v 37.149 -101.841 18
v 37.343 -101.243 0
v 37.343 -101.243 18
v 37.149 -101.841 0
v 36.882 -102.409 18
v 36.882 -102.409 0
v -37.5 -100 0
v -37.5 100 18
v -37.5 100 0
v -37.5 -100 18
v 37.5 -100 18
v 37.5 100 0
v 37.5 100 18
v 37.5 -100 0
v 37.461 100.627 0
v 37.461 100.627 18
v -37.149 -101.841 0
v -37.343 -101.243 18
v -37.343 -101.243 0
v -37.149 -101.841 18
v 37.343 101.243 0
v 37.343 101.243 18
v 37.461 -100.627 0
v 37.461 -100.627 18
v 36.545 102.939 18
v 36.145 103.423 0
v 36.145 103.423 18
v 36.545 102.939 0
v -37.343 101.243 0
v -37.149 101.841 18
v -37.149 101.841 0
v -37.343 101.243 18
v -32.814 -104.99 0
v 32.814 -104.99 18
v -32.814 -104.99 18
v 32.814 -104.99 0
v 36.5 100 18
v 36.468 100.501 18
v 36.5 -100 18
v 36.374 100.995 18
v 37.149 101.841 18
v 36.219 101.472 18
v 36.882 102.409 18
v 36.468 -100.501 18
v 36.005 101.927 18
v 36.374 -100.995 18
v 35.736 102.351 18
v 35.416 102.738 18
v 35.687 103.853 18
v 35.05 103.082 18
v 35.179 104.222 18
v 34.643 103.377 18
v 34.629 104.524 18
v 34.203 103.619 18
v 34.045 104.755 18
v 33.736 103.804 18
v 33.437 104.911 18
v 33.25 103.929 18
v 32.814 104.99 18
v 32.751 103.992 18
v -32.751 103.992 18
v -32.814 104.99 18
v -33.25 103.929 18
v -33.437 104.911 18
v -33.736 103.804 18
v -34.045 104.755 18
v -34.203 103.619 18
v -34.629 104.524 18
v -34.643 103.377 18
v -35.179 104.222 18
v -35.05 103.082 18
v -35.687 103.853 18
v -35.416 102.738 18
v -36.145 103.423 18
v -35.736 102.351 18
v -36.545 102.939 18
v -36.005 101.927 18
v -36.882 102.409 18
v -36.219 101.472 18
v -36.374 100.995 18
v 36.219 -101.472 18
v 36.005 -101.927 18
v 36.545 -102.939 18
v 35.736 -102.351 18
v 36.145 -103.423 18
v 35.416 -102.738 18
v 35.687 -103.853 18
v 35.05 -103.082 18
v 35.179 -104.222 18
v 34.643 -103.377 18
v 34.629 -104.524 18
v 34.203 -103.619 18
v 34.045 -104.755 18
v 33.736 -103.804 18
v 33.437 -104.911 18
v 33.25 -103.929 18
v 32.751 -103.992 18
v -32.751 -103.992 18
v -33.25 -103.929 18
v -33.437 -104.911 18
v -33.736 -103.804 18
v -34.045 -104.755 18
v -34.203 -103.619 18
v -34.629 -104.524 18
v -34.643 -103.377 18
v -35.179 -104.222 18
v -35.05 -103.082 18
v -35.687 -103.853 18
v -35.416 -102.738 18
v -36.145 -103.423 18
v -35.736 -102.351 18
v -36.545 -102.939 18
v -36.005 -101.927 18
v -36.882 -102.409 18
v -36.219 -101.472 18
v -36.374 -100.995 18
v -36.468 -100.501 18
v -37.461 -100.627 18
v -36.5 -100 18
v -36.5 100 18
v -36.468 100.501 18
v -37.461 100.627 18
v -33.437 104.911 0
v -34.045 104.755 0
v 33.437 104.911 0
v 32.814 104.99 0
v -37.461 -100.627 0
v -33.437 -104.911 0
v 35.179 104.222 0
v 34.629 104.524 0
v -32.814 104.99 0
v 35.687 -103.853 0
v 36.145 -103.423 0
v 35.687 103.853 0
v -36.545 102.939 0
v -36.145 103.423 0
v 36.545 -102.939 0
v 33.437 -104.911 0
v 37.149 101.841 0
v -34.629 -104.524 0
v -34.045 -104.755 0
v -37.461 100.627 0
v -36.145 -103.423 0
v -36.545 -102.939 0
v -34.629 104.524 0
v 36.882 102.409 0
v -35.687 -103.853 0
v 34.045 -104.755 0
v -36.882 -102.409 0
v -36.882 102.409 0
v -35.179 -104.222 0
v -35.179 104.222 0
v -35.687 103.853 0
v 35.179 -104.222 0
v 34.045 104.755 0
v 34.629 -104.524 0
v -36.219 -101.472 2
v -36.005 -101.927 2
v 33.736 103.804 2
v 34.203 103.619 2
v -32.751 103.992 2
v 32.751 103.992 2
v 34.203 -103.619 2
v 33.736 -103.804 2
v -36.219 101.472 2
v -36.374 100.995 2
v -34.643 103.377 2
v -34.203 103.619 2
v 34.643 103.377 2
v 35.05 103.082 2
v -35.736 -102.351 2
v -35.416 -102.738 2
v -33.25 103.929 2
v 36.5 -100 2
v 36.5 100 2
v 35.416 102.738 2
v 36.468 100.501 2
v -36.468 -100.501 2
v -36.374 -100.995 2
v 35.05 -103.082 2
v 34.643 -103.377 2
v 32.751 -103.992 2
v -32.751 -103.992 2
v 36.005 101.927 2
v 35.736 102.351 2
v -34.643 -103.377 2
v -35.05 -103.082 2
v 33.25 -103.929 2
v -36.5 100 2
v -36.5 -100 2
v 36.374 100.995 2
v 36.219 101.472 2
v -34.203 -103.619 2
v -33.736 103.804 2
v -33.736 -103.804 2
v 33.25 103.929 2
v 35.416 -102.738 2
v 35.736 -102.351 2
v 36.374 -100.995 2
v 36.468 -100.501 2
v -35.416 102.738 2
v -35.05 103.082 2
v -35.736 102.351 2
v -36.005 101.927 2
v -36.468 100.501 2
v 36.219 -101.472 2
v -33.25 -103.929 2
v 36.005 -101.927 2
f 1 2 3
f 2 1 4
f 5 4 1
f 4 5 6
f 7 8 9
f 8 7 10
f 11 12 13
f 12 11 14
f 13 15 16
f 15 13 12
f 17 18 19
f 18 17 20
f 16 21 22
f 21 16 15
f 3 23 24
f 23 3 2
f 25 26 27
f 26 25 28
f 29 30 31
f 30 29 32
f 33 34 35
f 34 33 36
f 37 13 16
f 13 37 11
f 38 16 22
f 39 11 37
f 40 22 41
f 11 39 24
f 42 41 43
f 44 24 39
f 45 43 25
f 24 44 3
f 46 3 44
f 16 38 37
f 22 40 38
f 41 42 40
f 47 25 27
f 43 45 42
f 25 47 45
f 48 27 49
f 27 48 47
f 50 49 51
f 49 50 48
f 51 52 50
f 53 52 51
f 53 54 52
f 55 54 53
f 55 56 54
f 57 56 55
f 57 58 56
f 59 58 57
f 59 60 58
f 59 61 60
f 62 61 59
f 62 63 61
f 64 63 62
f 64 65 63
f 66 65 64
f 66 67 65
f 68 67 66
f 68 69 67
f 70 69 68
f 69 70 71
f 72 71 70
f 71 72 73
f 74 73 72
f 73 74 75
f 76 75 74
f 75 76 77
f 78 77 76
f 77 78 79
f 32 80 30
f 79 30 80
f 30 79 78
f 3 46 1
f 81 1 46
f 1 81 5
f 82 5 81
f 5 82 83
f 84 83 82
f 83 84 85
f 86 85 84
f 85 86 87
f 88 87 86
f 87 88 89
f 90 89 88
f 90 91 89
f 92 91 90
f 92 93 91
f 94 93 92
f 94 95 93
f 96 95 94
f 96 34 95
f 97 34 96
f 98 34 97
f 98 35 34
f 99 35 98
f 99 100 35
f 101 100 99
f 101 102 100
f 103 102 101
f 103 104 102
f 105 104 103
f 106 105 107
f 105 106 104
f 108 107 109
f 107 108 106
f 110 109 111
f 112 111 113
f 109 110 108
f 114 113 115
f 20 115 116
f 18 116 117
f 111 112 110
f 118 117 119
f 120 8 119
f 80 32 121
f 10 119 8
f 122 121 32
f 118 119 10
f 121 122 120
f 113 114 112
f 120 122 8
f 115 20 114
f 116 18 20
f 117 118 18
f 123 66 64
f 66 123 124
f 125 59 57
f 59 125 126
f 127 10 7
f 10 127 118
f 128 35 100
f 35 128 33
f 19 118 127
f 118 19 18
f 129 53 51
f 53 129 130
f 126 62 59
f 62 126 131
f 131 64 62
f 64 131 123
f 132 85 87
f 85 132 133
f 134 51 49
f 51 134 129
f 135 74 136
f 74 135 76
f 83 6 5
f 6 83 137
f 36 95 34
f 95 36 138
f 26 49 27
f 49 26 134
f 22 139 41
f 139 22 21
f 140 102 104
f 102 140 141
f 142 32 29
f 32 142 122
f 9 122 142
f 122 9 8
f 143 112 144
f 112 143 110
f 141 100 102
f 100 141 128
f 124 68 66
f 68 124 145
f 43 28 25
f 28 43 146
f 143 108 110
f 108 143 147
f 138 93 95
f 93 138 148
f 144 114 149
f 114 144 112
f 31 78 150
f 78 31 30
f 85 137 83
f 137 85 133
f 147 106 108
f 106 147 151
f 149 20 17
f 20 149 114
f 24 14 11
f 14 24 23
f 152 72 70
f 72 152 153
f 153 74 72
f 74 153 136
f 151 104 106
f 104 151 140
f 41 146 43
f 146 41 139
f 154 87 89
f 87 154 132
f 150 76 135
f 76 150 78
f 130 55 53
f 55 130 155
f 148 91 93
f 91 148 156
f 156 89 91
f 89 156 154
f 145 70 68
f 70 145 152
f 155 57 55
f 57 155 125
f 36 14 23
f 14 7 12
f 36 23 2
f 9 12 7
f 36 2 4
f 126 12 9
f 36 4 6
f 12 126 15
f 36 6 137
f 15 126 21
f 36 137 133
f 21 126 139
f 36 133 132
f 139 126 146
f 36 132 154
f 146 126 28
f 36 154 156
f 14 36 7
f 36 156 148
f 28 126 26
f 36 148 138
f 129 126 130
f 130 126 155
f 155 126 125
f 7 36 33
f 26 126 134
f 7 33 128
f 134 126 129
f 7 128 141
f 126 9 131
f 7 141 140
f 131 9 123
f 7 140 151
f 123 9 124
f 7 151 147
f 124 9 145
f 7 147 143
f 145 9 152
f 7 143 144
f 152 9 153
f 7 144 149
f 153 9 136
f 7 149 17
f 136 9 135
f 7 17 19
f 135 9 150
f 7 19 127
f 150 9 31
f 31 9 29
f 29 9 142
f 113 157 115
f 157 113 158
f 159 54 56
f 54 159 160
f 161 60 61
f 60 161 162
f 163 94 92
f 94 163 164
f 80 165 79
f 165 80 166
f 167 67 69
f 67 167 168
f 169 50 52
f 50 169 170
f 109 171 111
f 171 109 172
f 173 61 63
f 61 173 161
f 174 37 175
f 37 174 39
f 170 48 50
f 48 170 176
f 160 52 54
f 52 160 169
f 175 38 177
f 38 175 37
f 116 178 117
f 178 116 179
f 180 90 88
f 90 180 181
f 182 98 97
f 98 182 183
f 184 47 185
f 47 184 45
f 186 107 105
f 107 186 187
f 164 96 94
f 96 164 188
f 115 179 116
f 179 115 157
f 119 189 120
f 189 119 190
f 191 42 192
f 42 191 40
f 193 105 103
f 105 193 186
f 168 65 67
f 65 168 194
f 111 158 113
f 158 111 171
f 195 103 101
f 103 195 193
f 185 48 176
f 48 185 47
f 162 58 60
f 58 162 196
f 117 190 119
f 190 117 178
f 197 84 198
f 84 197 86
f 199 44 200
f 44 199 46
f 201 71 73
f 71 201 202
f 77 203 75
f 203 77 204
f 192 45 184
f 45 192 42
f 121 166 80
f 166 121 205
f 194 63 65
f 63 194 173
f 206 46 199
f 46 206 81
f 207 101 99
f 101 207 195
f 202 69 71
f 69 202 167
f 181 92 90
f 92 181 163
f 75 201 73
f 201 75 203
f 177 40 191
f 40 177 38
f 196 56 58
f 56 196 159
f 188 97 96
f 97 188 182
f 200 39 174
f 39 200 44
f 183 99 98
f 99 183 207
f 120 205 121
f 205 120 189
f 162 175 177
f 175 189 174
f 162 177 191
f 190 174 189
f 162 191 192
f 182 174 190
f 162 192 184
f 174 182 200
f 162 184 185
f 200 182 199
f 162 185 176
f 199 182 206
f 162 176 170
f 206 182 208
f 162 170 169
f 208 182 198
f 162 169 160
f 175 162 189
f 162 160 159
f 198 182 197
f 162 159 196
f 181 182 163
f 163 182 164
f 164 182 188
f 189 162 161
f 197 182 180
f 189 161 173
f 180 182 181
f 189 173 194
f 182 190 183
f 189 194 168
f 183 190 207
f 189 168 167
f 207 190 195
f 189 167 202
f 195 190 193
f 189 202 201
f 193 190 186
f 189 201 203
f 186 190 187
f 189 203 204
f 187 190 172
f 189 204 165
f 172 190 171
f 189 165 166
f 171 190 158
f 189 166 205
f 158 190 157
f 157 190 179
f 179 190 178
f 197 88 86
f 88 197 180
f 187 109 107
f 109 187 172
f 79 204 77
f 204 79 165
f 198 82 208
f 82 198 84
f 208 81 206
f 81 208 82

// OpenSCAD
$fn = 50;


difference() {
	union() {
		hull() {
			translate(v = [-32.5000000000, 100.0000000000, 0]) {
				cylinder(h = 18, r = 5);
			}
			translate(v = [32.5000000000, 100.0000000000, 0]) {
				cylinder(h = 18, r = 5);
			}
			translate(v = [-32.5000000000, -100.0000000000, 0]) {
				cylinder(h = 18, r = 5);
			}
			translate(v = [32.5000000000, -100.0000000000, 0]) {
				cylinder(h = 18, r = 5);
			}
		}
	}
	union() {
		translate(v = [0, 0, 2]) {
			hull() {
				translate(v = [-32.5000000000, 100.0000000000, 0]) {
					cylinder(h = 16, r = 4);
				}
				translate(v = [32.5000000000, 100.0000000000, 0]) {
					cylinder(h = 16, r = 4);
				}
				translate(v = [-32.5000000000, -100.0000000000, 0]) {
					cylinder(h = 16, r = 4);
				}
				translate(v = [32.5000000000, -100.0000000000, 0]) {
					cylinder(h = 16, r = 4);
				}
			}
		}
	}
}
